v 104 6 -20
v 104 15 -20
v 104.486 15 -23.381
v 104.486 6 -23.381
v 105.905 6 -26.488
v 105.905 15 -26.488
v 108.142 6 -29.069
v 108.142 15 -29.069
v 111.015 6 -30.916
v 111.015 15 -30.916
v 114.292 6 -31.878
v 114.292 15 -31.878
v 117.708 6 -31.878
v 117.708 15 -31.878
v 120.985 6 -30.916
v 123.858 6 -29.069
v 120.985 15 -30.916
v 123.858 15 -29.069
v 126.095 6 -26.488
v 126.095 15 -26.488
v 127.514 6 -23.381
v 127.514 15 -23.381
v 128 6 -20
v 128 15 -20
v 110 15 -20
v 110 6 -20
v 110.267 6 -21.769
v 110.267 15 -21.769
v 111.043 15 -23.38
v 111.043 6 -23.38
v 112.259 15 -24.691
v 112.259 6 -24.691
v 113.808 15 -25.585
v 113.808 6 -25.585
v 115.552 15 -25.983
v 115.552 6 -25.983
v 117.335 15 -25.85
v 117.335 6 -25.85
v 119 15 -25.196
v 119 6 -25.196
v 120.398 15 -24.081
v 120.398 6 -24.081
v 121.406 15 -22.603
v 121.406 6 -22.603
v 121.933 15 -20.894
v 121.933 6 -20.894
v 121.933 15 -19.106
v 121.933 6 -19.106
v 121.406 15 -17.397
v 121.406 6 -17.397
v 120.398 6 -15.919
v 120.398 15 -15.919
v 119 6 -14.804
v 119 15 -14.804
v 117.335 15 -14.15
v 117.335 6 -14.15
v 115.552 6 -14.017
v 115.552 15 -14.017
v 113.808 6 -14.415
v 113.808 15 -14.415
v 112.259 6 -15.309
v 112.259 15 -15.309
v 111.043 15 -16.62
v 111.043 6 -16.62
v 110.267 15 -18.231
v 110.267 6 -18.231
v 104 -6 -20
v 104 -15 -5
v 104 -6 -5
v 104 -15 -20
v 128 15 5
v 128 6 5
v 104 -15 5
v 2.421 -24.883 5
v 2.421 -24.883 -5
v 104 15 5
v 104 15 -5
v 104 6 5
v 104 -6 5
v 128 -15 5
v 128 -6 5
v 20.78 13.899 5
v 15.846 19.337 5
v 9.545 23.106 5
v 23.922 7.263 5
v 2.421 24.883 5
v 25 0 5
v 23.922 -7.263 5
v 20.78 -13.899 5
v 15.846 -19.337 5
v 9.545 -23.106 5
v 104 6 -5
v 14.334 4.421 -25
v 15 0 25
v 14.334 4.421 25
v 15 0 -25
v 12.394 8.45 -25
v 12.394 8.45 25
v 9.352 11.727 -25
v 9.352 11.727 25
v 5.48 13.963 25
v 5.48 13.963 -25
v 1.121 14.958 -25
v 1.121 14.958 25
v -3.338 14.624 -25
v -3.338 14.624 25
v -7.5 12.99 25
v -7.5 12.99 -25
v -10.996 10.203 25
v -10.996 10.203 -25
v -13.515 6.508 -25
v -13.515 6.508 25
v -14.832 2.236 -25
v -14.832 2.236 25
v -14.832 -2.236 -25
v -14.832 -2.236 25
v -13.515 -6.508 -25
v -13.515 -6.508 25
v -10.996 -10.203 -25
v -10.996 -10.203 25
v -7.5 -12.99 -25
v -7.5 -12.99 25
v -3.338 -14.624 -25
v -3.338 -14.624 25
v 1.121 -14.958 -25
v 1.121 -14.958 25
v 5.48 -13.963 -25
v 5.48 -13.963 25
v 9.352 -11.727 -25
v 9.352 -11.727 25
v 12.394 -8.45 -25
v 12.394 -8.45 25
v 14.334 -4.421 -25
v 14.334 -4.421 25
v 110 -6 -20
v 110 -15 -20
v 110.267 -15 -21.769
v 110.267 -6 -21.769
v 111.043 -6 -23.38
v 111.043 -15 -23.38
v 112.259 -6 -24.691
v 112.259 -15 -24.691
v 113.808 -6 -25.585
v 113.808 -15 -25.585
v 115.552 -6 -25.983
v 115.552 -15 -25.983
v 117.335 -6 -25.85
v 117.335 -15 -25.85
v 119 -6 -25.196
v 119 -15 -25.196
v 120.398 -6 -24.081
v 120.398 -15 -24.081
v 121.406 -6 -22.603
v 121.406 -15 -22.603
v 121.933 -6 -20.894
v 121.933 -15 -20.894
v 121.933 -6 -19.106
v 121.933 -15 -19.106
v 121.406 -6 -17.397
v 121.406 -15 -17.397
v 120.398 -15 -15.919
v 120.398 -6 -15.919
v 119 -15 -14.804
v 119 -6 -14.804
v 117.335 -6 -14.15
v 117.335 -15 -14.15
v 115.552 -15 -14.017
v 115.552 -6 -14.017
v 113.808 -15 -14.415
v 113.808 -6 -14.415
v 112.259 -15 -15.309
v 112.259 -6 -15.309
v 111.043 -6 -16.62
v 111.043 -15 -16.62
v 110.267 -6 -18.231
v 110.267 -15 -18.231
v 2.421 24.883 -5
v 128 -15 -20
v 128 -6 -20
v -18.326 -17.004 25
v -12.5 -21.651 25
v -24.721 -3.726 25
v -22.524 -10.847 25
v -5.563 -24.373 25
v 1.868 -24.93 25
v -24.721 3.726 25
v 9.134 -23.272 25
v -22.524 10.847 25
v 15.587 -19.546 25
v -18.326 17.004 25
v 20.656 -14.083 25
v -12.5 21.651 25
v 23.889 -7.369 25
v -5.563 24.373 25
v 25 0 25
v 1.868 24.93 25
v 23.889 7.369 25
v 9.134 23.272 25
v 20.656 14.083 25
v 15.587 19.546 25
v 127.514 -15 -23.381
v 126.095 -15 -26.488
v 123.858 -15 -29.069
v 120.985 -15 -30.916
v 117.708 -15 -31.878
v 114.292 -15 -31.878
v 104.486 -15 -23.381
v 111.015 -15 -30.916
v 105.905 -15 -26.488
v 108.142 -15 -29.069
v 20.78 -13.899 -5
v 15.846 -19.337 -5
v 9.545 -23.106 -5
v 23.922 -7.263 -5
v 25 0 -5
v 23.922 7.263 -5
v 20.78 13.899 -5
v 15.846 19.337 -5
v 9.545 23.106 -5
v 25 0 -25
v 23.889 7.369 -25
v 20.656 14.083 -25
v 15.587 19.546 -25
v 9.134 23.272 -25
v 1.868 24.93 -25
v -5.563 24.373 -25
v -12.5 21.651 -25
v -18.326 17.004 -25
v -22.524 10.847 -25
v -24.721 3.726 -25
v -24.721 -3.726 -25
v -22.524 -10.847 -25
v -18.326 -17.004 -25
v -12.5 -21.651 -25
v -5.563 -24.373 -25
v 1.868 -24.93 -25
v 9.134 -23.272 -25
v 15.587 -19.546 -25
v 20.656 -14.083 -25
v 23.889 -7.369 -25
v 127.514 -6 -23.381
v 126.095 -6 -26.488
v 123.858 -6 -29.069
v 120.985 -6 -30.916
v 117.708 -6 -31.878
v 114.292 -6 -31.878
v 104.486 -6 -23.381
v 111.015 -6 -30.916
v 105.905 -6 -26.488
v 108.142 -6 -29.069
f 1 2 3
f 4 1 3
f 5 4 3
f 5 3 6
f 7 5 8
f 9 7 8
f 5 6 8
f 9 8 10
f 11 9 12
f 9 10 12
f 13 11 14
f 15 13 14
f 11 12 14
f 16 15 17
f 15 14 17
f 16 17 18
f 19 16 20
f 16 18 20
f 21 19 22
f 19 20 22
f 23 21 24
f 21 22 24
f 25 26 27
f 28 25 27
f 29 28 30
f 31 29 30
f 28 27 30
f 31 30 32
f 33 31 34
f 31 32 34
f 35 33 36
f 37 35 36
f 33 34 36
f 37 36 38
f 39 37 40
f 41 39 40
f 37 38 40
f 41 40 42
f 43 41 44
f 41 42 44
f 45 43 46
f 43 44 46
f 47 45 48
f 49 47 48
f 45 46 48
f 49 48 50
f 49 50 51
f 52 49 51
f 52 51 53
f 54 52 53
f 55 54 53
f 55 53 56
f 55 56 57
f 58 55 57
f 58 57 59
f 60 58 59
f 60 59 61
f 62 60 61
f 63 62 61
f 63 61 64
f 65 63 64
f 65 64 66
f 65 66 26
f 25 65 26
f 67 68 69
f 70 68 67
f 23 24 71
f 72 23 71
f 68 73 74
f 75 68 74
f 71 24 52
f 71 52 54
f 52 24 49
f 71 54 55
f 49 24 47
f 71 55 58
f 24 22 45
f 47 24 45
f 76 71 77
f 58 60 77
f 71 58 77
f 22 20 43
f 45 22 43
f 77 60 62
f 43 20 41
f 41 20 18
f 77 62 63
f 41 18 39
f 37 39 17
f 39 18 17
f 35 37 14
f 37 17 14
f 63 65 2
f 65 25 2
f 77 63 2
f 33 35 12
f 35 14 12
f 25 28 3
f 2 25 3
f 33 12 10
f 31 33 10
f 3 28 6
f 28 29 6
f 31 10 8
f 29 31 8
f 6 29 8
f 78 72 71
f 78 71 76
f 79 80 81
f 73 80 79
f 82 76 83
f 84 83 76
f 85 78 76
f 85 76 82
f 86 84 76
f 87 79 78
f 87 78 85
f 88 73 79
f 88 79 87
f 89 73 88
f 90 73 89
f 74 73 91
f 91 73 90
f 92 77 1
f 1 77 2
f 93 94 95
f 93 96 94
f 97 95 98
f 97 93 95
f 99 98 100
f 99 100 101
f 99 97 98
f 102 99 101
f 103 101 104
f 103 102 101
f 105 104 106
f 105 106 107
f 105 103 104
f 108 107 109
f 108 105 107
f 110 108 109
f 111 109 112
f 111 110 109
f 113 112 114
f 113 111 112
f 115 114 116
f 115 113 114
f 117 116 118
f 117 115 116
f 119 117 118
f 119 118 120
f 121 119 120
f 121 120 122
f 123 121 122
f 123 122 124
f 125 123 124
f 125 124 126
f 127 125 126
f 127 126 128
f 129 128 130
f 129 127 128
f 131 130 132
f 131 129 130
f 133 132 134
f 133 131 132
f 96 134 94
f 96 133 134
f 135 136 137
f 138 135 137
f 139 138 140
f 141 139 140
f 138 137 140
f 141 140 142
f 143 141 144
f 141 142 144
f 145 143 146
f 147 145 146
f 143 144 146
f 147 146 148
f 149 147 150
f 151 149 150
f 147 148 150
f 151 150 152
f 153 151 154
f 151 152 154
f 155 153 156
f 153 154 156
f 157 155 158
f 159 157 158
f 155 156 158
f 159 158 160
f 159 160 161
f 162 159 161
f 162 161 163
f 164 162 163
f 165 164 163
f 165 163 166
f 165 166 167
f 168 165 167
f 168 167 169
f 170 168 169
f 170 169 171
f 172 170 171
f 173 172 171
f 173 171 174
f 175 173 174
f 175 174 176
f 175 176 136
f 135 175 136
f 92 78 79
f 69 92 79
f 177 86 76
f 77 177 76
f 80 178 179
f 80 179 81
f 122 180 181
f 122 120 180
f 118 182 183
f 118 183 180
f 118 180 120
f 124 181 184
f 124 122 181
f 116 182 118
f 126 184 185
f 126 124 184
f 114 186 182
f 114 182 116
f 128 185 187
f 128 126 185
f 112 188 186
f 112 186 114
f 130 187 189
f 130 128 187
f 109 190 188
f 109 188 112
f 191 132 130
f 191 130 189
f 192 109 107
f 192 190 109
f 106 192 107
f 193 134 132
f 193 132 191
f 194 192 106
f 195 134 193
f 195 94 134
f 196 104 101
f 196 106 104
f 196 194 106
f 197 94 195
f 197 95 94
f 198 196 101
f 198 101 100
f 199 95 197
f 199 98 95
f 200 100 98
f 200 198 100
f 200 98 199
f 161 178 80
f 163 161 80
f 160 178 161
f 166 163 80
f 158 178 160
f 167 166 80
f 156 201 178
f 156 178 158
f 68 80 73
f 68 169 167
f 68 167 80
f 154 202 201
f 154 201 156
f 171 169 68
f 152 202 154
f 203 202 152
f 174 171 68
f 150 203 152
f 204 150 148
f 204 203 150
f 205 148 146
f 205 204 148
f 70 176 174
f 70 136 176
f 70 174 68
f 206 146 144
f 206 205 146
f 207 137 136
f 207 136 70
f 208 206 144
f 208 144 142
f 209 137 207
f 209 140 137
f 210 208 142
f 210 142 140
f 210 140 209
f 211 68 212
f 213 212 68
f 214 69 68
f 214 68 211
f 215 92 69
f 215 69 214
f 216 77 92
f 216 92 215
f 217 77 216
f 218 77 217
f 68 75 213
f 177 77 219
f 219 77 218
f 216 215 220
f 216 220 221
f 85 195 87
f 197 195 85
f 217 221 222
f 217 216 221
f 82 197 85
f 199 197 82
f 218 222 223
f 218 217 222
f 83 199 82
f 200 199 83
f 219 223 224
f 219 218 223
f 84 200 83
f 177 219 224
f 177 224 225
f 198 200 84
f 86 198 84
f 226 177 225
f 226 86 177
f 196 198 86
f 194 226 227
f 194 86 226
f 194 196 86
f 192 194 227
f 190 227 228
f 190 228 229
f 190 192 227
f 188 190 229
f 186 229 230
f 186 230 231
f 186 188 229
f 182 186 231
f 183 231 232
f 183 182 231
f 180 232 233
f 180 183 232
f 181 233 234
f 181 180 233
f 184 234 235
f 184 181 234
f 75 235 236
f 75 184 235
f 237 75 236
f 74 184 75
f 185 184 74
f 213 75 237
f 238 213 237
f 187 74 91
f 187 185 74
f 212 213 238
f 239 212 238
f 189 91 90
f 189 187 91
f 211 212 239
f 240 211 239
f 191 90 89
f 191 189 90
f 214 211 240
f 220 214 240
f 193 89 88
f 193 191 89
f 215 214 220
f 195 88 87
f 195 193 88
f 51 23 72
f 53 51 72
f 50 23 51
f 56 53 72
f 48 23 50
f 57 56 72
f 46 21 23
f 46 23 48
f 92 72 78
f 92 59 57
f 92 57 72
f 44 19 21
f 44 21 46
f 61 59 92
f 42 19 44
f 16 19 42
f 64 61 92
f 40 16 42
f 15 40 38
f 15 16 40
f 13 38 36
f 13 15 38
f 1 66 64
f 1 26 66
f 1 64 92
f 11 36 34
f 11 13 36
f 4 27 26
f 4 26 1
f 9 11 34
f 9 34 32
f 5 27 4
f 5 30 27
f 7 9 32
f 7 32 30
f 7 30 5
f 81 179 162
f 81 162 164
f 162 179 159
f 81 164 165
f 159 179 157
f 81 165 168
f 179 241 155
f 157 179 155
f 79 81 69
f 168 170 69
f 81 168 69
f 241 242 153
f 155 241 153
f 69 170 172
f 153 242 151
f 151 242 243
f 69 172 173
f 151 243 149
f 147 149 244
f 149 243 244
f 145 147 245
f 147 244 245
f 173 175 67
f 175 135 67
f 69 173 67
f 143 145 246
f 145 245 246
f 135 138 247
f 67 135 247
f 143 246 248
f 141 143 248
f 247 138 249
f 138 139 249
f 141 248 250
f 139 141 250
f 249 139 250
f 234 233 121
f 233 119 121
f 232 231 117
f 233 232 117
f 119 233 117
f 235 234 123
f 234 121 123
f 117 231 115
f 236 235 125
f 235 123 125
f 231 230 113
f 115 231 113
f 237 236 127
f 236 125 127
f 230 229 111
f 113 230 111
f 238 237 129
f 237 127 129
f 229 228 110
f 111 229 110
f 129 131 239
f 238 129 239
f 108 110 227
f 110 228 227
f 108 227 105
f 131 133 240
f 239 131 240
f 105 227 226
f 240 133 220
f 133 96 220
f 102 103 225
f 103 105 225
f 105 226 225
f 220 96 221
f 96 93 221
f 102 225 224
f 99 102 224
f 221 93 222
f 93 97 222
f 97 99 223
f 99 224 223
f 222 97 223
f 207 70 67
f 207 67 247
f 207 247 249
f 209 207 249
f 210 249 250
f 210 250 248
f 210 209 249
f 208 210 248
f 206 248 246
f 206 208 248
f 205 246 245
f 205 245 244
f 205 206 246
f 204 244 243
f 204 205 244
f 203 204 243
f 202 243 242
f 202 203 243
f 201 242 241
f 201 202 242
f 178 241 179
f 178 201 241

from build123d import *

# Parameters (mm, degrees)
SKETCH1_R           = 25
SKETCH1_R_2         = 15
BOSS_EXTRUDE1_DEPTH = 25
BOSS_EXTRUDE2_START = -30
BOSS_EXTRUDE2_DEPTH = 10
BOSS_EXTRUDE3_START = 15
BOSS_EXTRUDE3_DEPTH = 9
HOLE1_D             = 12


with BuildPart() as part:
    # Sketch1 → Boss-Extrude1 (new, symmetric)
    with BuildSketch(Plane.XY):
        Circle(SKETCH1_R)
        Circle(SKETCH1_R_2, mode=Mode.SUBTRACT)
    extrude(amount=BOSS_EXTRUDE1_DEPTH, both=True)

    # Sketch3 → Boss-Extrude2 (add)
    with BuildSketch(Plane(origin=(0, 0, -25), x_dir=(-1, 0, 0), z_dir=(0, 0, -1)).offset(BOSS_EXTRUDE2_START)):
        with BuildLine():
            Line((-104, 15), (-104, -15))
            Line((-104, -15), (-2.420790466, -24.882519437))
            ThreePointArc((-2.420790466, -24.882519437), (-25, 0), (-2.420790466, 24.882519437))
            Line((-2.420790466, 24.882519437), (-104, 15))
        make_face()
    extrude(amount=BOSS_EXTRUDE2_DEPTH)

    # Sketch6 → Boss-Extrude3 (add)
    with BuildSketch(Plane(origin=(0, 0, 0), x_dir=(1, 0, 0), z_dir=(0, 1, 0)).offset(BOSS_EXTRUDE3_START)):
        with BuildLine():
            Line((104, -5), (104, 20))
            ThreePointArc((104, 20), (116, 32), (128, 20))
            Line((128, 20), (128, -5))
            Line((128, -5), (104, -5))
        make_face()
    boss_extrude3 = extrude(amount=-BOSS_EXTRUDE3_DEPTH)

    # Mirror1: Boss-Extrude3 across plane
    add(boss_extrude3.mirror(Plane.ZX))

    # Hole1 (through all)
    with Locations(Plane(origin=(0, 15, 0), x_dir=(1, 0, 0), z_dir=(0, 1, 0))):
        with Locations((116, 20)):
            Hole(HOLE1_D / 2)


solid = part.part
